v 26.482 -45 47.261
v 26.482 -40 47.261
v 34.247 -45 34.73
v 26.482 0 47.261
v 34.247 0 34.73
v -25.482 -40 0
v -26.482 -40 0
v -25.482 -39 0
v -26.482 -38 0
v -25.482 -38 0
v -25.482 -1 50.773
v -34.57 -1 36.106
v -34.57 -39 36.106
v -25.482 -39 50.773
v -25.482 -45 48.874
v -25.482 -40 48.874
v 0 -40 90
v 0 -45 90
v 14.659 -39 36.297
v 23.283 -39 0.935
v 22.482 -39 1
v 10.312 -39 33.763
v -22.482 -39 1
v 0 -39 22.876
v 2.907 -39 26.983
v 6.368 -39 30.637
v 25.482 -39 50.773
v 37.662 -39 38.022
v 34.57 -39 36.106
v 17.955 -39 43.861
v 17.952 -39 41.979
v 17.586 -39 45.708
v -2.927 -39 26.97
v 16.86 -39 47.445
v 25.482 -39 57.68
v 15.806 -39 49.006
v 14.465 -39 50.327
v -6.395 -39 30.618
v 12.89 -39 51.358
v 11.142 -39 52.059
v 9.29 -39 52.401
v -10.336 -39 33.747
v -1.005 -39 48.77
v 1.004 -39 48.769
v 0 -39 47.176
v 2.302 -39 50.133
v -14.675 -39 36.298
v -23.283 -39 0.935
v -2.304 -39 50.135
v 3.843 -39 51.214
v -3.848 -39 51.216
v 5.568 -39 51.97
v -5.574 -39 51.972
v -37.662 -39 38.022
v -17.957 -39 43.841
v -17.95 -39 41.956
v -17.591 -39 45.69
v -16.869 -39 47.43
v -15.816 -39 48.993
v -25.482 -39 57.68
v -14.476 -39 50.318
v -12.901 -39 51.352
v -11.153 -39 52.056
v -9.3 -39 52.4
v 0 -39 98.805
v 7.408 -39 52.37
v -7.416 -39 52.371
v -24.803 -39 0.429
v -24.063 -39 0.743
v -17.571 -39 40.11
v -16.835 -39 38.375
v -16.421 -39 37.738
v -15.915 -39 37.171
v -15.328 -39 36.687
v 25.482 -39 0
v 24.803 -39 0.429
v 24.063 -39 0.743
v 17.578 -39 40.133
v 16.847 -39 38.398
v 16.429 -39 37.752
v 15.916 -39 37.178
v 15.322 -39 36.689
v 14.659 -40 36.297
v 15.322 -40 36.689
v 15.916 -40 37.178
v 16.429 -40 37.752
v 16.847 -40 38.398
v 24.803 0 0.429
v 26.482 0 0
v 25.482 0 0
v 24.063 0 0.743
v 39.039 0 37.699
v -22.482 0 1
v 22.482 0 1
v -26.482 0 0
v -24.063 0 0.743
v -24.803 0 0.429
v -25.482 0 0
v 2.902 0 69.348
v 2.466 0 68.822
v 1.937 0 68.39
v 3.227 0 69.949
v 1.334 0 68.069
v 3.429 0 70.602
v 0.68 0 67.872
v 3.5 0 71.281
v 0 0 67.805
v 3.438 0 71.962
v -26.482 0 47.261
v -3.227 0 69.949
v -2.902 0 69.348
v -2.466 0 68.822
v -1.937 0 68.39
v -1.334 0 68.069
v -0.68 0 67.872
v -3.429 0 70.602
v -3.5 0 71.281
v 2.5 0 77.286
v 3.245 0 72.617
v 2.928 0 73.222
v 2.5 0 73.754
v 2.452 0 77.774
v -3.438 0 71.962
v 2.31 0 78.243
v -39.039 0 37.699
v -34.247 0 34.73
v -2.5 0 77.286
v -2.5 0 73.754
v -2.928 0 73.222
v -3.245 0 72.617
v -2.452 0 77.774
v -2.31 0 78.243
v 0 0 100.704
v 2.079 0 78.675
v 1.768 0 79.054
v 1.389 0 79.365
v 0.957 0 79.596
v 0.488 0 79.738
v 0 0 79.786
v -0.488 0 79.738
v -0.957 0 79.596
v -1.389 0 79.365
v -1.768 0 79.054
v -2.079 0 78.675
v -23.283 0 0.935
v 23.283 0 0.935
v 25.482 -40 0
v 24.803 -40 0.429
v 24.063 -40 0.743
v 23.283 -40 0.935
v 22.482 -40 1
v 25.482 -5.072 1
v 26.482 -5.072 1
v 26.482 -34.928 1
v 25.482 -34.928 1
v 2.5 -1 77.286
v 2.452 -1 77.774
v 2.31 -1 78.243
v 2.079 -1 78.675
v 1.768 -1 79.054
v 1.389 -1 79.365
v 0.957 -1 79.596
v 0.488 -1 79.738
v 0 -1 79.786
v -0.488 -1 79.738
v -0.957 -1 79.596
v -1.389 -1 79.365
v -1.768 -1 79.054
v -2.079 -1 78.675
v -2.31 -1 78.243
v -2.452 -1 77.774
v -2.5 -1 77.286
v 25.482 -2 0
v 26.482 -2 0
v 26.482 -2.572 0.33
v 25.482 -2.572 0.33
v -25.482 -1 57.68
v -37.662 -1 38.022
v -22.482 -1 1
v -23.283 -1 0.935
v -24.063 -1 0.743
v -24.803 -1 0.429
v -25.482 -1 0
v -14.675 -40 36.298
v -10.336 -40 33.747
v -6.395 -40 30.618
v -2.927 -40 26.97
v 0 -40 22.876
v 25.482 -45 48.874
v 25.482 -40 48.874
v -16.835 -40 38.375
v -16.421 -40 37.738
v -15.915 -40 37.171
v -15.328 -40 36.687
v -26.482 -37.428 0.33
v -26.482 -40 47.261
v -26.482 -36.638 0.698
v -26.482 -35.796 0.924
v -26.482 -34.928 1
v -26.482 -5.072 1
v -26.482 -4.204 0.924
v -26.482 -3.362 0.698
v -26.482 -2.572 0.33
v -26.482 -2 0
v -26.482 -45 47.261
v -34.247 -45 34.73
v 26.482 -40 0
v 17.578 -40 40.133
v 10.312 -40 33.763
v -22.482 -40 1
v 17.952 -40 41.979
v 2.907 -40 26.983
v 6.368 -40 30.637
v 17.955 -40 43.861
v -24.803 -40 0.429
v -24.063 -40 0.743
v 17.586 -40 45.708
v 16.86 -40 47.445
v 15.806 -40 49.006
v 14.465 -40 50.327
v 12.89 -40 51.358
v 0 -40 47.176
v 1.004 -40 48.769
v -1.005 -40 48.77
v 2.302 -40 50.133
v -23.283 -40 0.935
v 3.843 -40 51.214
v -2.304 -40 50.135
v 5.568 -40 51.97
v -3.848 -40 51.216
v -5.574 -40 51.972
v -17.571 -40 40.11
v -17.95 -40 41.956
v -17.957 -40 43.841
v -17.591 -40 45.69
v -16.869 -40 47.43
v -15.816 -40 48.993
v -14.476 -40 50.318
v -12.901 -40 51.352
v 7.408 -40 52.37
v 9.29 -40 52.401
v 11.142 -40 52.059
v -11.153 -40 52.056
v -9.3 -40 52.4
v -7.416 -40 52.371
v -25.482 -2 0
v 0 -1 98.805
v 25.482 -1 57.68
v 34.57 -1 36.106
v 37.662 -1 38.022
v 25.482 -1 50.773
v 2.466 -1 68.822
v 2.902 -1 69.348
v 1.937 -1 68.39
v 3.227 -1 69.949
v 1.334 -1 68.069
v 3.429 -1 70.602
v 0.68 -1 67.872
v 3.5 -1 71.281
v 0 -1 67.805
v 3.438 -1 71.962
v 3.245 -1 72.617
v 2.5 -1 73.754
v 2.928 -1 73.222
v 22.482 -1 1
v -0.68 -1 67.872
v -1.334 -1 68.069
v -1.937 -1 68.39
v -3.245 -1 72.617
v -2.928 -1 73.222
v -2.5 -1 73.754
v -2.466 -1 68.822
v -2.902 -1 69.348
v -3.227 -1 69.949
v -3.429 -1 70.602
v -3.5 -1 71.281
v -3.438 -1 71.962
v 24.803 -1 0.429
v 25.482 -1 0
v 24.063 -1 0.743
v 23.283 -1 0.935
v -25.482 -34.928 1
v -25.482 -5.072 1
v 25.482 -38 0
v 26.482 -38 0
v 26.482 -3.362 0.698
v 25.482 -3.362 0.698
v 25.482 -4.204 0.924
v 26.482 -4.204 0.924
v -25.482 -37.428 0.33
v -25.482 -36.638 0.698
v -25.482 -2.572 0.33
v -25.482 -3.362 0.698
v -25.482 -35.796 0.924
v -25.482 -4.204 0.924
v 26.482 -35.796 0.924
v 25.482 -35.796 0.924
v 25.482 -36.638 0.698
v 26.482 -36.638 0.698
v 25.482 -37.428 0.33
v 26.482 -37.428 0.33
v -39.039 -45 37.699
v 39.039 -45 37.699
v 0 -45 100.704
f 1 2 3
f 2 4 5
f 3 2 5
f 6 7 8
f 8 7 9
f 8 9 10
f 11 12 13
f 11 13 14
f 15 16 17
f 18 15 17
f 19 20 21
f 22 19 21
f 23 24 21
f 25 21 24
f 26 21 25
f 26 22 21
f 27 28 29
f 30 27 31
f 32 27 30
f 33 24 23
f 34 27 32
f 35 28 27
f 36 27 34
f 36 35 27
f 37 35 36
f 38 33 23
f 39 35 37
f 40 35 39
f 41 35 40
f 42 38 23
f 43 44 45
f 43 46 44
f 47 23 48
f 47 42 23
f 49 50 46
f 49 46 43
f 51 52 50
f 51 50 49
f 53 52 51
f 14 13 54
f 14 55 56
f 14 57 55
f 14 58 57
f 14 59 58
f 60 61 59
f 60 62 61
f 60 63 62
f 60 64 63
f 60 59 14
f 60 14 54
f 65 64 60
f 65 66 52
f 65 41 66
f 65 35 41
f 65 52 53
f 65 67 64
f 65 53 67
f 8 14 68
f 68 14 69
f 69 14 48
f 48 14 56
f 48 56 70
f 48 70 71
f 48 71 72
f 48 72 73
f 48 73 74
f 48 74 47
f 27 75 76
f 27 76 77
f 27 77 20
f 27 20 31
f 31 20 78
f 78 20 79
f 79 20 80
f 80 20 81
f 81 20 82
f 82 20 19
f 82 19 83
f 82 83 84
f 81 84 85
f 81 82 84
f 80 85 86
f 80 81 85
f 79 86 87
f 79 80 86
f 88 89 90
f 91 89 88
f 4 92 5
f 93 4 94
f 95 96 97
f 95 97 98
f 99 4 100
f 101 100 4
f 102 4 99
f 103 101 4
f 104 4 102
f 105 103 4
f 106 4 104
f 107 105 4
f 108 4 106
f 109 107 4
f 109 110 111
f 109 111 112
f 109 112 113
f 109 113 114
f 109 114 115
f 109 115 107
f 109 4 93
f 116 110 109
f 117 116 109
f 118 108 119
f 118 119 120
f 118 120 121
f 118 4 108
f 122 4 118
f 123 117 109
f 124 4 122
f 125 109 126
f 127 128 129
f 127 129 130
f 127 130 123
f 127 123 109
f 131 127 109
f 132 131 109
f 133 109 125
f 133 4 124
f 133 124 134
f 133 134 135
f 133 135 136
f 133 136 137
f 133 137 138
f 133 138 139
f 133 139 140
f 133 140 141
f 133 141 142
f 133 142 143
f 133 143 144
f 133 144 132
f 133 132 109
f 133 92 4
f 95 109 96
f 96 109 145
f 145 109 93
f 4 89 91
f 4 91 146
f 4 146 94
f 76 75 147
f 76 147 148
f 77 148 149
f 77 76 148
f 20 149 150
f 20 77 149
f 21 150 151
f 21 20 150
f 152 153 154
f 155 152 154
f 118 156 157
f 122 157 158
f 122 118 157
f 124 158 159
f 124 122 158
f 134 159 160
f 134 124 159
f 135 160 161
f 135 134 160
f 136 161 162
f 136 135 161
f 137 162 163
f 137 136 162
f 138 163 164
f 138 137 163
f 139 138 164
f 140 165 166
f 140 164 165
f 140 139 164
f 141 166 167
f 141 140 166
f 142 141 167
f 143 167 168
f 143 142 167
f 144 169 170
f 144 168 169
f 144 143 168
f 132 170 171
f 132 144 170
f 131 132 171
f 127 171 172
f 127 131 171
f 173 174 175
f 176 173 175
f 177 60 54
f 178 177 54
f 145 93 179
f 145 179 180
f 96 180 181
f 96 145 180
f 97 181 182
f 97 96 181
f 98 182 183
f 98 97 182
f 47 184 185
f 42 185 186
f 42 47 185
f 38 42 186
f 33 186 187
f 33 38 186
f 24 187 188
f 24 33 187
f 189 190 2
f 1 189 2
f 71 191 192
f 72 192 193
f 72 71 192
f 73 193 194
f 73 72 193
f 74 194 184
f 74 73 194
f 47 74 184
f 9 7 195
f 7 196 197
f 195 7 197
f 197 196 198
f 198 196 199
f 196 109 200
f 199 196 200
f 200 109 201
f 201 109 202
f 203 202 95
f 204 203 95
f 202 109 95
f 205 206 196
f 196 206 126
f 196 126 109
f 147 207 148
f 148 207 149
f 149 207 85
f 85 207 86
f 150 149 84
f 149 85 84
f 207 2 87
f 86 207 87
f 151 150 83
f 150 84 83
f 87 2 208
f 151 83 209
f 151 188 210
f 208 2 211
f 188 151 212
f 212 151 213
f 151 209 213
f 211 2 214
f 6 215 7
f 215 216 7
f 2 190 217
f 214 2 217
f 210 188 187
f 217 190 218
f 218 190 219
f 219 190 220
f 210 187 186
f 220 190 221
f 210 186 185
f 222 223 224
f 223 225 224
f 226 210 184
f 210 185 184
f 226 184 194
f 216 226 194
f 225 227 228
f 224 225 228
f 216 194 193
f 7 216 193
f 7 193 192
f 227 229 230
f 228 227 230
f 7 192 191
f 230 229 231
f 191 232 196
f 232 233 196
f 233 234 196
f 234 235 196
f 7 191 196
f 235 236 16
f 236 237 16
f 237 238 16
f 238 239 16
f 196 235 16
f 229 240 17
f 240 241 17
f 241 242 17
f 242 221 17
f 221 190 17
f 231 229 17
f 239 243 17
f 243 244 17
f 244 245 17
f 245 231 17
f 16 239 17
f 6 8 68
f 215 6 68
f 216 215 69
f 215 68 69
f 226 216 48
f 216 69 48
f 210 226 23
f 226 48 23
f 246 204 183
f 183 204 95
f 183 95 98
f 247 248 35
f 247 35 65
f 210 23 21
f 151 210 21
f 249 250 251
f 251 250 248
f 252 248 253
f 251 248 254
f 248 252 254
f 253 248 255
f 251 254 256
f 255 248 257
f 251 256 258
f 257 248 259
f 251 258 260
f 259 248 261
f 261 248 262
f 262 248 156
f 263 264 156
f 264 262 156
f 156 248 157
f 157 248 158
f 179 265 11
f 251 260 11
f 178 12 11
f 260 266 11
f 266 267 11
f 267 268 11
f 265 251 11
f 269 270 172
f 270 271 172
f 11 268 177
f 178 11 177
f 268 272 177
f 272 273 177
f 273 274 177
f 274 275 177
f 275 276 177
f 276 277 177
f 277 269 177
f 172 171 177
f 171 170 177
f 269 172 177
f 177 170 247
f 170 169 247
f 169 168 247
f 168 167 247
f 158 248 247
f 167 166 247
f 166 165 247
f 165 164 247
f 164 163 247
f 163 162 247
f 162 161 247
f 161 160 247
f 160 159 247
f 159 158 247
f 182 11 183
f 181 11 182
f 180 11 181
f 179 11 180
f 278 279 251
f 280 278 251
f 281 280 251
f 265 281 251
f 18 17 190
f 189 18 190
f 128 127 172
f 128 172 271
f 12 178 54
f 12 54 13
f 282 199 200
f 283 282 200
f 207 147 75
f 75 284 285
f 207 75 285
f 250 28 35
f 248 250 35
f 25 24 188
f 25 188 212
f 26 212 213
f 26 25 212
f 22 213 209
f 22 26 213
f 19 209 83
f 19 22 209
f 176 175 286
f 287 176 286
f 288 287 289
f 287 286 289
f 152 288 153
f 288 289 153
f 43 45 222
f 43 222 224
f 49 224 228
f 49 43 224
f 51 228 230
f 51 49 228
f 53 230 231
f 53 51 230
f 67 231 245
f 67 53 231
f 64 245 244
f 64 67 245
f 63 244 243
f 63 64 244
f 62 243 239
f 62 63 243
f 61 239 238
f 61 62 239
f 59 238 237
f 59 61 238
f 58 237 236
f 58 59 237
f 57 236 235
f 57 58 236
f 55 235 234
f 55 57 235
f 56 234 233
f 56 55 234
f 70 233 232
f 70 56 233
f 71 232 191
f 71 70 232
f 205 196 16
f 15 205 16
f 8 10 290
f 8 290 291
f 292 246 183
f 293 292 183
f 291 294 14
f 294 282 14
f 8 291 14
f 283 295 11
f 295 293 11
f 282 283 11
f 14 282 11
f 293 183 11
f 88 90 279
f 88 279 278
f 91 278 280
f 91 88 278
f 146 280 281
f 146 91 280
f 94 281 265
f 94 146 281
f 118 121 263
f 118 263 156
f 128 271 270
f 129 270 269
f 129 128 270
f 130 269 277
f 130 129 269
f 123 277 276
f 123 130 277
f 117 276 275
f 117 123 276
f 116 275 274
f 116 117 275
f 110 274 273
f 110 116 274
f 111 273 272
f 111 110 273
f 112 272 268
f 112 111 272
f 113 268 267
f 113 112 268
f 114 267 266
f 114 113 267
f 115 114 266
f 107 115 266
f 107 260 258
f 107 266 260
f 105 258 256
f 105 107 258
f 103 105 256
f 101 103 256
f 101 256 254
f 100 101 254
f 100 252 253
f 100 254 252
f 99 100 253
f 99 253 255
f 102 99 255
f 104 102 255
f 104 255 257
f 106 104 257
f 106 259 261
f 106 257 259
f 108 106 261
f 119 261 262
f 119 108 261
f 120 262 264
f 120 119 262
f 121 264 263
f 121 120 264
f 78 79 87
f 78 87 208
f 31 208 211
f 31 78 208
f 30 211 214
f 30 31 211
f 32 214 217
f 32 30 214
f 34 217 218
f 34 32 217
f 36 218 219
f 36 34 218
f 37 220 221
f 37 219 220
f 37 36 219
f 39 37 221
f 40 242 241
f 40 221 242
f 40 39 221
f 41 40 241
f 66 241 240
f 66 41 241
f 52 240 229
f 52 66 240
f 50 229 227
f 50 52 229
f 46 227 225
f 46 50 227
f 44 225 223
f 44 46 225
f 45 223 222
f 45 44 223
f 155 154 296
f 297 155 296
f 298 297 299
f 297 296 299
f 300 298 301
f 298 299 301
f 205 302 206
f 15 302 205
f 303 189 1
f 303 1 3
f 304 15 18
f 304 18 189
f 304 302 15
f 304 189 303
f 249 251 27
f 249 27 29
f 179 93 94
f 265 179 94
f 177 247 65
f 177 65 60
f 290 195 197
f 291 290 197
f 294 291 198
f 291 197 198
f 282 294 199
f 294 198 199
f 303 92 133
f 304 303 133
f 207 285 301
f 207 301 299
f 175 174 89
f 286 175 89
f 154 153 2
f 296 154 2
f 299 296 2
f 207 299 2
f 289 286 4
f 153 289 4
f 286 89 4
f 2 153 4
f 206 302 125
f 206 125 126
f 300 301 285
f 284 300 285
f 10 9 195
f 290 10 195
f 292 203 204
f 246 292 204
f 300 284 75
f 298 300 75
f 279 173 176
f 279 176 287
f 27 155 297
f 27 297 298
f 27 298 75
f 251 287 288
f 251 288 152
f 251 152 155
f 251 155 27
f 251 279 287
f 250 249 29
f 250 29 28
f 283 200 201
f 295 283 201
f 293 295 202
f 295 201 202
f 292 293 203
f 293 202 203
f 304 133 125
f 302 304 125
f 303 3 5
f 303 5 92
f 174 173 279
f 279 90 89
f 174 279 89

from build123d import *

# Parameters (mm, degrees)
F0_W         = 50.964426635
F0_H         = 1
F1_DEPTH     = 40
F2_DEPTH     = 45
F3_DEPTH     = 5
F4_START     = 1
F4_DEPTH     = 44.001
F6_START     = 1
F6_DEPTH     = 38
F7_START     = 1
F7_DEPTH     = 44.001
F9_DEPTH     = 25
F11_DEPTH    = 25
F12_T1_DEPTH = 1
F12_T3_DEPTH = 1


# Not quite as in the source:
# - a fillet or chamfer that OpenCascade refuses, or shapes differently, is made with other operations: its cross-section is extruded or revolved along the edge and cut away or added


with BuildPart() as f1:
    # F0 (on Front) → F1 (new body)
    with BuildSketch(Plane.XZ):
        Polygon((25.4822133175, 48.8744375096), (0, 90), (-25.4822133175, 48.8744375096), (-25.4822133175, 1), (25.4822133175, 1), align=None)
        with BuildLine():
            ThreePointArc((-16.8351454988, 38.3754507383), (-12.9010914993, 51.3524985976), (0, 47.1760898363))
            ThreePointArc((0, 47.1760898363), (12.8897582031, 51.3584134172), (16.847382477, 38.3979000332))
            ThreePointArc((16.847382477, 38.3979000332), (15.916282128, 37.1777103045), (14.6589247027, 36.2974471967))
            ThreePointArc((14.6589247027, 36.2974471967), (6.3677193864, 30.6369091459), (0, 22.8755995631))
            ThreePointArc((0, 22.8755995631), (-6.3946665322, 30.6177021843), (-14.6752906719, 36.297770574))
            ThreePointArc((-14.6752906719, 36.297770574), (-15.914547628, 37.1709794451), (-16.8351454988, 38.3754507383))
        make_face(mode=Mode.SUBTRACT)
        with BuildLine():
            Line((-2.5, 73.7544666829), (-2.5, 77.2864818573))
            ThreePointArc((-2.5, 77.2864818573), (0, 79.7864818573), (2.5, 77.2864818573))
            Line((2.5, 77.2864818573), (2.5, 73.7544666829))
            ThreePointArc((2.5, 73.7544666829), (0, 67.8049769402), (-2.5, 73.7544666829))
        make_face(mode=Mode.SUBTRACT)
        with BuildLine():
            ThreePointArc((16.847382477, 38.3979000332), (12.8897582031, 51.3584134172), (0, 47.1760898363))
            ThreePointArc((0, 47.1760898363), (-12.9010914993, 51.3524985976), (-16.8351454988, 38.3754507383))
            ThreePointArc((-16.8351454988, 38.3754507383), (-15.914547628, 37.1709794451), (-14.6752906719, 36.297770574))
            ThreePointArc((-14.6752906719, 36.297770574), (-6.3946665322, 30.6177021843), (0, 22.8755995631))
            ThreePointArc((0, 22.8755995631), (6.3677193864, 30.6369091459), (14.6589247027, 36.2974471967))
            ThreePointArc((14.6589247027, 36.2974471967), (15.916282128, 37.1777103045), (16.847382477, 38.3979000332))
        make_face()
        with BuildLine():
            ThreePointArc((2.5, 77.2864818573), (0, 79.7864818573), (-2.5, 77.2864818573))
            Line((-2.5, 77.2864818573), (-2.5, 73.7544666829))
            ThreePointArc((-2.5, 73.7544666829), (0, 67.8049769402), (2.5, 73.7544666829))
            Line((2.5, 73.7544666829), (2.5, 77.2864818573))
        make_face()
        with Locations((0, 0.5)):
            Rectangle(F0_W, F0_H)
        Polygon((-25.4822133175, 1), (-25.4822133175, 48.8744375096), (-26.4822133175, 47.2605446354), (-26.4822133175, 0), (-25.4822133175, 0), align=None)
        Polygon((26.4822133175, 47.2605446354), (25.4822133175, 48.8744375096), (25.4822133175, 1), (25.4822133175, 0), (26.4822133175, 0), align=None)
    extrude(amount=F1_DEPTH)

    # F0 (on Front) → F2 (join)
    with BuildSketch(Plane.XZ):
        Polygon((-26.4822133175, 47.2605446354), (-25.4822133175, 48.8744375096), (-25.4822133175, 50.7730291479), (-34.5699527606, 36.1063912187), (-37.6622251316, 38.0224244453), (-25.4822133175, 57.679658719), (0, 98.8052212095), (25.4822133175, 57.679658719), (37.6622251316, 38.0224244453), (34.5699527606, 36.1063912187), (25.4822133175, 50.7730291479), (25.4822133175, 48.8744375096), (26.4822133175, 47.2605446354), (34.2466115735, 34.7296376181), (39.0389787322, 37.6990832582), (0, 100.7038128478), (-39.0389787322, 37.6990832582), (-34.2466115735, 34.7296376181), align=None)
        Polygon((-25.4822133175, 48.8744375096), (0, 90), (25.4822133175, 48.8744375096), (25.4822133175, 50.7730291479), (25.4822133175, 57.679658719), (0, 98.8052212095), (-25.4822133175, 57.679658719), (-25.4822133175, 50.7730291479), align=None)
        Polygon((-34.5699527606, 36.1063912187), (-25.4822133175, 50.7730291479), (-25.4822133175, 57.679658719), (-37.6622251316, 38.0224244453), align=None)
        Polygon((25.4822133175, 57.679658719), (25.4822133175, 50.7730291479), (34.5699527606, 36.1063912187), (37.6622251316, 38.0224244453), align=None)
    extrude(amount=F2_DEPTH)

    # F0 (on Front) → F3 (cut)
    with BuildSketch(Plane.XZ):
        with BuildLine():
            ThreePointArc((2.5, 77.2864818573), (0, 79.7864818573), (-2.5, 77.2864818573))
            Line((-2.5, 77.2864818573), (-2.5, 73.7544666829))
            ThreePointArc((-2.5, 73.7544666829), (0, 67.8049769402), (2.5, 73.7544666829))
            Line((2.5, 73.7544666829), (2.5, 77.2864818573))
        make_face()
        with Locations((0, 0.5)):
            Rectangle(F0_W, F0_H)
    extrude(amount=F3_DEPTH, mode=Mode.SUBTRACT)

    # F0 (on Front) → F4 (cut)
    with BuildSketch(Plane.XZ.offset(F4_START)):
        with BuildLine():
            ThreePointArc((16.847382477, 38.3979000332), (12.8897582031, 51.3584134172), (0, 47.1760898363))
            ThreePointArc((0, 47.1760898363), (-12.9010914993, 51.3524985976), (-16.8351454988, 38.3754507383))
            ThreePointArc((-16.8351454988, 38.3754507383), (-15.914547628, 37.1709794451), (-14.6752906719, 36.297770574))
            ThreePointArc((-14.6752906719, 36.297770574), (-6.3946665322, 30.6177021843), (0, 22.8755995631))
            ThreePointArc((0, 22.8755995631), (6.3677193864, 30.6369091459), (14.6589247027, 36.2974471967))
            ThreePointArc((14.6589247027, 36.2974471967), (15.916282128, 37.1777103045), (16.847382477, 38.3979000332))
        make_face()
    extrude(amount=F4_DEPTH, mode=Mode.SUBTRACT)

    # F0 (on Front) → F6 (cut)
    with BuildSketch(Plane.XZ.offset(F6_START)):
        Polygon((25.4822133175, 48.8744375096), (0, 90), (-25.4822133175, 48.8744375096), (-25.4822133175, 1), (25.4822133175, 1), align=None)
        with BuildLine():
            ThreePointArc((-16.8351454988, 38.3754507383), (-12.9010914993, 51.3524985976), (0, 47.1760898363))
            ThreePointArc((0, 47.1760898363), (12.8897582031, 51.3584134172), (16.847382477, 38.3979000332))
            ThreePointArc((16.847382477, 38.3979000332), (15.916282128, 37.1777103045), (14.6589247027, 36.2974471967))
            ThreePointArc((14.6589247027, 36.2974471967), (6.3677193864, 30.6369091459), (0, 22.8755995631))
            ThreePointArc((0, 22.8755995631), (-6.3946665322, 30.6177021843), (-14.6752906719, 36.297770574))
            ThreePointArc((-14.6752906719, 36.297770574), (-15.914547628, 37.1709794451), (-16.8351454988, 38.3754507383))
        make_face(mode=Mode.SUBTRACT)
        with BuildLine():
            Line((-2.5, 73.7544666829), (-2.5, 77.2864818573))
            ThreePointArc((-2.5, 77.2864818573), (0, 79.7864818573), (2.5, 77.2864818573))
            Line((2.5, 77.2864818573), (2.5, 73.7544666829))
            ThreePointArc((2.5, 73.7544666829), (0, 67.8049769402), (-2.5, 73.7544666829))
        make_face(mode=Mode.SUBTRACT)
        Polygon((-25.4822133175, 48.8744375096), (0, 90), (25.4822133175, 48.8744375096), (25.4822133175, 50.7730291479), (25.4822133175, 57.679658719), (0, 98.8052212095), (-25.4822133175, 57.679658719), (-25.4822133175, 50.7730291479), align=None)
        with BuildLine():
            ThreePointArc((2.5, 77.2864818573), (0, 79.7864818573), (-2.5, 77.2864818573))
            Line((-2.5, 77.2864818573), (-2.5, 73.7544666829))
            ThreePointArc((-2.5, 73.7544666829), (0, 67.8049769402), (2.5, 73.7544666829))
            Line((2.5, 73.7544666829), (2.5, 77.2864818573))
        make_face()
        Polygon((-34.5699527606, 36.1063912187), (-25.4822133175, 50.7730291479), (-25.4822133175, 57.679658719), (-37.6622251316, 38.0224244453), align=None)
        Polygon((25.4822133175, 57.679658719), (25.4822133175, 50.7730291479), (34.5699527606, 36.1063912187), (37.6622251316, 38.0224244453), align=None)
        with Locations((0, 0.5)):
            Rectangle(F0_W, F0_H)
    extrude(amount=F6_DEPTH, mode=Mode.SUBTRACT)

    # F0 (on Front) → F7 (cut)
    with BuildSketch(Plane.XZ.offset(F7_START)):
        with Locations((0, 0.5)):
            Rectangle(F0_W, F0_H)
    extrude(amount=F7_DEPTH, mode=Mode.SUBTRACT)

    # F8 (on face) → F9 (cut)
    with BuildSketch(Plane(origin=(-26.4822133175, 0, 0), x_dir=(0, -1, 0), z_dir=(-1, 0, 0))):
        with BuildLine():
            Line((34.9282032303, 1), (5.0717967697, 1))
            ThreePointArc((5.0717967697, 1), (3.7777015442, 0.8296291314), (2.5717967697, 0.3301270189))
            Line((2.5717967697, 0.3301270189), (2, 0))
            Line((2, 0), (38, 0))
            Line((38, 0), (37.4282032303, 0.3301270189))
            ThreePointArc((37.4282032303, 0.3301270189), (36.2222984558, 0.8296291314), (34.9282032303, 1))
        make_face()
    extrude(amount=-F9_DEPTH, mode=Mode.SUBTRACT)

    # F10 (on face) → F11 (cut)
    with BuildSketch(Plane.YZ.offset(26.4822133175)):
        with BuildLine():
            Line((-37.4282032303, 0.3301270189), (-38, 0))
            Line((-38, 0), (-2, 0))
            Line((-2, 0), (-2.5717967697, 0.3301270189))
            ThreePointArc((-2.5717967697, 0.3301270189), (-3.7777015442, 0.8296291314), (-5.0717967697, 1))
            Line((-5.0717967697, 1), (-34.9282032303, 1))
            ThreePointArc((-34.9282032303, 1), (-36.2222984558, 0.8296291314), (-37.4282032303, 0.3301270189))
        make_face()
    extrude(amount=-F11_DEPTH, mode=Mode.SUBTRACT)

    # F12: fillet of radius 5 on 4 edges, made by hand

    # F12_s2 → F12_t1 (join)
    with BuildSketch(Plane.XZ):
        with BuildLine():
            ThreePointArc((25.4822133175, 0), (24.0633521476, 0.7434164903), (22.4822133175, 1))
            Line((22.4822133175, 1), (25.4822133175, 1))
            Line((25.4822133175, 1), (25.4822133175, 0))
        make_face()
        with BuildLine():
            ThreePointArc((-22.4822133175, 1), (-24.0633521476, 0.7434164903), (-25.4822133175, 0))
            Line((-25.4822133175, 0), (-25.4822133175, 1))
            Line((-25.4822133175, 1), (-22.4822133175, 1))
        make_face()
    extrude(amount=F12_T1_DEPTH)

    # F12_s4 → F12_t3 (join)
    with BuildSketch(Plane.XZ.offset(39)):
        with BuildLine():
            ThreePointArc((25.4822133175, 0), (24.0633521476, 0.7434164903), (22.4822133175, 1))
            Line((22.4822133175, 1), (25.4822133175, 1))
            Line((25.4822133175, 1), (25.4822133175, 0))
        make_face()
        with BuildLine():
            ThreePointArc((-25.4822133175, 0), (-24.0633521476, 0.7434164903), (-22.4822133175, 1))
            Line((-22.4822133175, 1), (-25.4822133175, 1))
            Line((-25.4822133175, 1), (-25.4822133175, 0))
        make_face()
    extrude(amount=F12_T3_DEPTH)


solid = f1.part
